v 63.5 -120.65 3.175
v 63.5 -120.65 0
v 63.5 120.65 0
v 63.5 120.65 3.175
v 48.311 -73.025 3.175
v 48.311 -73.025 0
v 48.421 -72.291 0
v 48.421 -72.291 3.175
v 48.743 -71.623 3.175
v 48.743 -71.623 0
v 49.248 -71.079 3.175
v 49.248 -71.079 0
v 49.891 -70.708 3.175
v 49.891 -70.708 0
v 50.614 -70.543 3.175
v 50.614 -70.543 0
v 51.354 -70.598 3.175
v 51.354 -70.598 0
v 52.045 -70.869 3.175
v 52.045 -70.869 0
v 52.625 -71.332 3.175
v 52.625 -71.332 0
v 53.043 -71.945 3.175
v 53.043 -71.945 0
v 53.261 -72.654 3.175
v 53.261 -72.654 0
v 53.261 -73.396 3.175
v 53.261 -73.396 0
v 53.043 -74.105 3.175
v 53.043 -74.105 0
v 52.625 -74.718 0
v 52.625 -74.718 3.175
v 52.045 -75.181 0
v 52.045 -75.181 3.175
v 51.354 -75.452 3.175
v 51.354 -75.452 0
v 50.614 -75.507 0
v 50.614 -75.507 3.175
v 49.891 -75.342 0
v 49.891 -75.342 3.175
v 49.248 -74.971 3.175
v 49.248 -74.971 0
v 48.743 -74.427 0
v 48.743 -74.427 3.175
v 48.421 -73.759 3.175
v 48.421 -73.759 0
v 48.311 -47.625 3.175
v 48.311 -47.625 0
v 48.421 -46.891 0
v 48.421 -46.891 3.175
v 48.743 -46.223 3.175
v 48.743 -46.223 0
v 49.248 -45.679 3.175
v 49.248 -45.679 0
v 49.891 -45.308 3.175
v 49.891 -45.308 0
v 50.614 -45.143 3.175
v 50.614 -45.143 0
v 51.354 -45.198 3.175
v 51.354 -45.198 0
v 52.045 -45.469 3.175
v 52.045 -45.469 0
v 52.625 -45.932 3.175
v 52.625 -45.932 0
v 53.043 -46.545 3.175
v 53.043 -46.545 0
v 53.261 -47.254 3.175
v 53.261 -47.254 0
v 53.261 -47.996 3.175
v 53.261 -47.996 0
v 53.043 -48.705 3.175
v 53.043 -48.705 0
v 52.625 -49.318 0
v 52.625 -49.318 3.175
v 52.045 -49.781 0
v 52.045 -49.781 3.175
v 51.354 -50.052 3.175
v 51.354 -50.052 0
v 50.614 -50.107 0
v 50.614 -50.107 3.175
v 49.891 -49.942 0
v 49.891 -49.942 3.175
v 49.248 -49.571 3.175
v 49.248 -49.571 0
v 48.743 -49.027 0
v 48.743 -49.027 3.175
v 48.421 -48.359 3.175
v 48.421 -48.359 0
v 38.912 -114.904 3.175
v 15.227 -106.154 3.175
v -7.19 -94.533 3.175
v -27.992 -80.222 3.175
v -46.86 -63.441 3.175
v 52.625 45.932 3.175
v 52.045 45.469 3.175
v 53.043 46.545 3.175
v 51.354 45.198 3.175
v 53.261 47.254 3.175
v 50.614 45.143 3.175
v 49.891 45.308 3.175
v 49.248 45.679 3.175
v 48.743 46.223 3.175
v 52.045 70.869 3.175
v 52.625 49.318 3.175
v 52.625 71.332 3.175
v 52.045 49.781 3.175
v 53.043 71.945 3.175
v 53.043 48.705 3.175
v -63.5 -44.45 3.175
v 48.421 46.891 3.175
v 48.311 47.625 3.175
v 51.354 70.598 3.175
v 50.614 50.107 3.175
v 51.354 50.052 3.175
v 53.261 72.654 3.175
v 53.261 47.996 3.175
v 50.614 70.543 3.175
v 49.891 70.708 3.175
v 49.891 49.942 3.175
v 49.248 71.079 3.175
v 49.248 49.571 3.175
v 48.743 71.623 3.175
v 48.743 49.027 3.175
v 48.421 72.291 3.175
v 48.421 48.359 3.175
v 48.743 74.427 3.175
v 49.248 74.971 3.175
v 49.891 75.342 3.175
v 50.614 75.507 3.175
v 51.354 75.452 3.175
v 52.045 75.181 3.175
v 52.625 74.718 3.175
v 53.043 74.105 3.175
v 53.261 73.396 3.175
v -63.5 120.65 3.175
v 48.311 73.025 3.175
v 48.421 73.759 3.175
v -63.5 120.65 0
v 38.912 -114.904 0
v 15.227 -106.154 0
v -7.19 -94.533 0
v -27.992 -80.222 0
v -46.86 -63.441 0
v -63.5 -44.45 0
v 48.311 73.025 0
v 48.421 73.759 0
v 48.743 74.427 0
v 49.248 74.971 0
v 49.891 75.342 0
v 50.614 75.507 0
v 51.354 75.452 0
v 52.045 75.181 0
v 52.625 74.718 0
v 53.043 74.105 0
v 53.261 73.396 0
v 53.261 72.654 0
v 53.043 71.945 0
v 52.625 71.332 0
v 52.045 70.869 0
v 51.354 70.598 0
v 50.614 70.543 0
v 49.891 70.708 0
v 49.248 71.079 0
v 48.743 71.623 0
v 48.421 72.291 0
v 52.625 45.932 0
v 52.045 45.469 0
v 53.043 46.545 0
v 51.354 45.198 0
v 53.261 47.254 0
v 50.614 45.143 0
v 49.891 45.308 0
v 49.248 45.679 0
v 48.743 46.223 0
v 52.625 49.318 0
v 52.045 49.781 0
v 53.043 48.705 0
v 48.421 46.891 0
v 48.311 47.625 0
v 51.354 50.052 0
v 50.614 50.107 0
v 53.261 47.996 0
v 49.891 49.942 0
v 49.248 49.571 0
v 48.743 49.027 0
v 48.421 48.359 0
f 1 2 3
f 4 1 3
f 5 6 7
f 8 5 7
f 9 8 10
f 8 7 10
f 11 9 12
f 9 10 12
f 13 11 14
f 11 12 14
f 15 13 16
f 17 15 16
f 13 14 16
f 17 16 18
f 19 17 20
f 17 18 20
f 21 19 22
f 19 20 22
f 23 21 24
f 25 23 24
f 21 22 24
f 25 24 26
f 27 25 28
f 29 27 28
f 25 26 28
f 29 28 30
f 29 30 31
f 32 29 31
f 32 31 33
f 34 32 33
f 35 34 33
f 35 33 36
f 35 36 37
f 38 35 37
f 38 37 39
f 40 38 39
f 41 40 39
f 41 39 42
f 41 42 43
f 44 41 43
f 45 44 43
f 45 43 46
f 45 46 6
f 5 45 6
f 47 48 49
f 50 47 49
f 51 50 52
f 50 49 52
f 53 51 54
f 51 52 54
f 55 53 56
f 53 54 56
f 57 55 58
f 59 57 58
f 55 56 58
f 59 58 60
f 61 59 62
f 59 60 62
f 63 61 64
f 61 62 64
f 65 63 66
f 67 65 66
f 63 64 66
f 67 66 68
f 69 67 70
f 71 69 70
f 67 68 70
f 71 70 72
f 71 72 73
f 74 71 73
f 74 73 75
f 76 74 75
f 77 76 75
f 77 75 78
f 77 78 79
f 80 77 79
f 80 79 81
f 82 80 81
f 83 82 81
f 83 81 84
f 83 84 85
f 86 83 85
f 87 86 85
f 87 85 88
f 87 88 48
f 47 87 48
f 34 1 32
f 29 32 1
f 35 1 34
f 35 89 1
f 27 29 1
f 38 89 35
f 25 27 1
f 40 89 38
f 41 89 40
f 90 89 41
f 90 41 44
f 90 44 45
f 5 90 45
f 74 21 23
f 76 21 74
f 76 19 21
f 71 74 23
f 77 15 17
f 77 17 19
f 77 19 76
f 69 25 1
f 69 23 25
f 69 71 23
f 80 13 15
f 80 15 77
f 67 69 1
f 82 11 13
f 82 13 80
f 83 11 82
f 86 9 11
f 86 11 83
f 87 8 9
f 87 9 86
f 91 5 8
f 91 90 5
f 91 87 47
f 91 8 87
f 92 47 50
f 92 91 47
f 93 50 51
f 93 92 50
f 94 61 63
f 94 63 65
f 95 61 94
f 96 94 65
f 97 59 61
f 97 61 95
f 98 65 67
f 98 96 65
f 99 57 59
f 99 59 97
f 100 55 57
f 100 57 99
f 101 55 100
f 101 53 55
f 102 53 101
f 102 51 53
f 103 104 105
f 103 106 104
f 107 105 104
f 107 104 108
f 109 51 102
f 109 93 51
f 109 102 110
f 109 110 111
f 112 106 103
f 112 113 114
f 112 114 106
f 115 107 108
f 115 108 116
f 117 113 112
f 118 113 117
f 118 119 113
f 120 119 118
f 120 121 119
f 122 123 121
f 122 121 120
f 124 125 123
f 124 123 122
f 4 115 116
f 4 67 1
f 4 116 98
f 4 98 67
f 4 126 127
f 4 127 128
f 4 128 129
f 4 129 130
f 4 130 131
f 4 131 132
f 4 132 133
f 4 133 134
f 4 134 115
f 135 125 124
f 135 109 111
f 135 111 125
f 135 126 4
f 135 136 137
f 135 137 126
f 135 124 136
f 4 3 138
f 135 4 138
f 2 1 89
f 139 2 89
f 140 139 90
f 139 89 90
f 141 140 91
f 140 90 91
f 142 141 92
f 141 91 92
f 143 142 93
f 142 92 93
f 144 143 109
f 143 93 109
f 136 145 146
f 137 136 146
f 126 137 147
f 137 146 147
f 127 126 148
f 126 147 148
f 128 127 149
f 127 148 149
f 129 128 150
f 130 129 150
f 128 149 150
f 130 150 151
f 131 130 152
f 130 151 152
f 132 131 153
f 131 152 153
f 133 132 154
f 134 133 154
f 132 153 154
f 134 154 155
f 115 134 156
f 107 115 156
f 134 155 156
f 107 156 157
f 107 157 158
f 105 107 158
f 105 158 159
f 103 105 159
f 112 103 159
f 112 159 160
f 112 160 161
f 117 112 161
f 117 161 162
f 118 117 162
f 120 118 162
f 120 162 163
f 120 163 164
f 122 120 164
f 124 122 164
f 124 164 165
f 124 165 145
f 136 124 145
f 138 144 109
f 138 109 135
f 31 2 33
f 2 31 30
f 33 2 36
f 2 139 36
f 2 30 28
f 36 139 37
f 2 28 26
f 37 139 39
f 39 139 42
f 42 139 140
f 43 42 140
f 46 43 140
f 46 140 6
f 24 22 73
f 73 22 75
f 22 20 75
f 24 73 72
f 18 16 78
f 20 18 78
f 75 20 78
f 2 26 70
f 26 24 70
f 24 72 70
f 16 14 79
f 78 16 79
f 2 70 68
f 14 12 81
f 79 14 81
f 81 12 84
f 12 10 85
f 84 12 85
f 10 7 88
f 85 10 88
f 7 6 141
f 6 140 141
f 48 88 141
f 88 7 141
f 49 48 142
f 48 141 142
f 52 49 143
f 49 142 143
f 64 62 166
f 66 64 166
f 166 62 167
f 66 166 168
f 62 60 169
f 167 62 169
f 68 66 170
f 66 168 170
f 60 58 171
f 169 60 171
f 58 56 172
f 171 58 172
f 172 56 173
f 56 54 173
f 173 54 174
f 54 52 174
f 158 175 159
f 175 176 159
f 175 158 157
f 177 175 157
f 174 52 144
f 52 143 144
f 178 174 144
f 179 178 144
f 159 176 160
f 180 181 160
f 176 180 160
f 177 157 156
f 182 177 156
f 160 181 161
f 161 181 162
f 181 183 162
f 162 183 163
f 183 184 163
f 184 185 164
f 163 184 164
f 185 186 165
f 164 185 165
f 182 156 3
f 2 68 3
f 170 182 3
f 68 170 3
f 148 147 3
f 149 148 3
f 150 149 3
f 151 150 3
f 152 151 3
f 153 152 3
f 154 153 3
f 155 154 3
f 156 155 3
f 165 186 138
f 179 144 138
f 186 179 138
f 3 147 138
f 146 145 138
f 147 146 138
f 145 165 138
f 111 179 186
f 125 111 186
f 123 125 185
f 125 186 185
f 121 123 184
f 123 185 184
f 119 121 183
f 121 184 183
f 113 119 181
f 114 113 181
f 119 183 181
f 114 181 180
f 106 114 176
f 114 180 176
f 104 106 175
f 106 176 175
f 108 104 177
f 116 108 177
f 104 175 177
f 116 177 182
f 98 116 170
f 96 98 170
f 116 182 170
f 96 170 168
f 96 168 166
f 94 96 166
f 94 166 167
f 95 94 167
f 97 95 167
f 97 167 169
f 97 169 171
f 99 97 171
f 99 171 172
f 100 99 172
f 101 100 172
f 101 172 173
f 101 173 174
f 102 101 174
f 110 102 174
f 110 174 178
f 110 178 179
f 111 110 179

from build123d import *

# Parameters (mm, degrees)
SKETCH1_W                  = 241.3
SKETCH1_H                  = 127
BOSS_EXTRUDE1_DEPTH        = 3.175
F_9_0_196_DIAMETER_HOLE1_D = 4.9784
CUT_EXTRUDE1_DEPTH         = 137.377245628


with BuildPart() as part:
    # Sketch1 → Boss-Extrude1 (new body)
    with BuildSketch(Plane(origin=(0, 0, 0), x_dir=(0, 1, 0), z_dir=(0, 0, 1))):
        Rectangle(SKETCH1_W, SKETCH1_H)
    extrude(amount=BOSS_EXTRUDE1_DEPTH)

    # #9 (0.196) Diameter Hole1 (through all)
    with Locations(Plane.XY.offset(3.175)):
        with Locations((50.8, 73.025), (50.8, -73.025), (50.8, -47.625), (50.8, 47.625)):
            Hole(F_9_0_196_DIAMETER_HOLE1_D / 2)

    # Sketch4 → Cut-Extrude1 (cut, through all)
    with BuildSketch(Plane.XY.offset(3.175)):
        with BuildLine():
            Line((-63.5, -44.45), (-63.5, -120.65))
            Line((-63.5, -120.65), (63.5, -120.65))
            ThreePointArc((63.5, -120.65), (-7.189698378, -94.53283063), (-63.5, -44.45))
        make_face()
    extrude(amount=-CUT_EXTRUDE1_DEPTH, mode=Mode.SUBTRACT)


solid = part.part
